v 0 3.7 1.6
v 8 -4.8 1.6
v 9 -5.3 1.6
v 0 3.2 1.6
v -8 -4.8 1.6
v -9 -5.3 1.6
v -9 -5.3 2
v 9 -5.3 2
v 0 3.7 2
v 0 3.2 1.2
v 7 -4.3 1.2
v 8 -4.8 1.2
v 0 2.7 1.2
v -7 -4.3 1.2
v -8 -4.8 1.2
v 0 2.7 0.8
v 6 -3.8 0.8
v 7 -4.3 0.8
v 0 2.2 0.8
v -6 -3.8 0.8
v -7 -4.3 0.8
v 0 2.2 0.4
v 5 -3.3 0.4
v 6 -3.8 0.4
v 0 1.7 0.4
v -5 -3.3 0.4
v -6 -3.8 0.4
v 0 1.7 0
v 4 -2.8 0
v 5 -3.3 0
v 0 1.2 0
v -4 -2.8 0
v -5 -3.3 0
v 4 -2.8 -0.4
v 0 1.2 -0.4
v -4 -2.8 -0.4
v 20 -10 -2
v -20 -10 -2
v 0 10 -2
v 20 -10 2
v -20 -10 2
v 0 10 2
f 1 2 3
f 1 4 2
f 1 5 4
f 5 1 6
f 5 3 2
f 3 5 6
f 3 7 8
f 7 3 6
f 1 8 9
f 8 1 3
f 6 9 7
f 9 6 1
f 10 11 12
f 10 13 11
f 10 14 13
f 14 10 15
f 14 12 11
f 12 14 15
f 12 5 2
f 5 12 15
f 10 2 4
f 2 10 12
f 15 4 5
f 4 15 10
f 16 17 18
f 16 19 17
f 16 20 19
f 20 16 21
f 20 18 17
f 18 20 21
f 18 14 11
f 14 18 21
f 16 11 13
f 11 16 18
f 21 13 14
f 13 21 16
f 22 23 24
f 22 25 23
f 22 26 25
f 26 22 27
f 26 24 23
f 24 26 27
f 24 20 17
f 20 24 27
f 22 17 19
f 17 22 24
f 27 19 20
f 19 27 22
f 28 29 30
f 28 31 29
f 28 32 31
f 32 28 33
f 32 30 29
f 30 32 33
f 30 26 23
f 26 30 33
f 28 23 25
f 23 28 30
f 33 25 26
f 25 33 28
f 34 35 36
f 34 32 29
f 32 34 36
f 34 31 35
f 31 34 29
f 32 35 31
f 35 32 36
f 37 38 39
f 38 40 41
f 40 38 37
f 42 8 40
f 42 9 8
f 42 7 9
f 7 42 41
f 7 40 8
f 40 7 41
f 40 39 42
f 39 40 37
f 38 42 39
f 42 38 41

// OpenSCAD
// file: triangle.scad
include <vars.scad>;

module triangle(){
  translate([0, 0, -TRIANGLE_THICKNESS/2]) {
    linear_extrude(TRIANGLE_THICKNESS) {
      polygon([[-TRIANGLE_SIDE/2, -TRIANGLE_SIDE/4], [0, TRIANGLE_SIDE/4], [TRIANGLE_SIDE/2, -TRIANGLE_SIDE/4]]);
    };
  }
}

color(COLOR, 1) {
  triangle();
}
// file: vars.scad
$fn = 12;
COLOR = "LimeGreen"; // Model color
TRIANGLE_SIDE = 40; // Triangle side size
TRIANGLE_THICKNESS = 4; // Triagle thickness
JOINT_WIDTH = TRIANGLE_SIDE/4; // Max width for clip/hinge
JOINT_TOLLERANCE = 0.5; // Fixed joint tollerance
// main file
include <vars.scad>;
use <triangle.scad>;

STEP = 0.2;
SCALE_STEP = 1 - STEP;
ITERATIONS = 6;

module base(){
    
  difference() {
    triangle();
    for(i=[1:ITERATIONS]) {
      translate([0, 0 - STEP * 4, TRIANGLE_THICKNESS - STEP * i * 2]) {
       scale([0.5 - STEP * i / 4, 0.5 - STEP * i / 4, 1]) {
          triangle();
        }
      }
    }
  }
}

color(COLOR, 1) {
  base();
}
